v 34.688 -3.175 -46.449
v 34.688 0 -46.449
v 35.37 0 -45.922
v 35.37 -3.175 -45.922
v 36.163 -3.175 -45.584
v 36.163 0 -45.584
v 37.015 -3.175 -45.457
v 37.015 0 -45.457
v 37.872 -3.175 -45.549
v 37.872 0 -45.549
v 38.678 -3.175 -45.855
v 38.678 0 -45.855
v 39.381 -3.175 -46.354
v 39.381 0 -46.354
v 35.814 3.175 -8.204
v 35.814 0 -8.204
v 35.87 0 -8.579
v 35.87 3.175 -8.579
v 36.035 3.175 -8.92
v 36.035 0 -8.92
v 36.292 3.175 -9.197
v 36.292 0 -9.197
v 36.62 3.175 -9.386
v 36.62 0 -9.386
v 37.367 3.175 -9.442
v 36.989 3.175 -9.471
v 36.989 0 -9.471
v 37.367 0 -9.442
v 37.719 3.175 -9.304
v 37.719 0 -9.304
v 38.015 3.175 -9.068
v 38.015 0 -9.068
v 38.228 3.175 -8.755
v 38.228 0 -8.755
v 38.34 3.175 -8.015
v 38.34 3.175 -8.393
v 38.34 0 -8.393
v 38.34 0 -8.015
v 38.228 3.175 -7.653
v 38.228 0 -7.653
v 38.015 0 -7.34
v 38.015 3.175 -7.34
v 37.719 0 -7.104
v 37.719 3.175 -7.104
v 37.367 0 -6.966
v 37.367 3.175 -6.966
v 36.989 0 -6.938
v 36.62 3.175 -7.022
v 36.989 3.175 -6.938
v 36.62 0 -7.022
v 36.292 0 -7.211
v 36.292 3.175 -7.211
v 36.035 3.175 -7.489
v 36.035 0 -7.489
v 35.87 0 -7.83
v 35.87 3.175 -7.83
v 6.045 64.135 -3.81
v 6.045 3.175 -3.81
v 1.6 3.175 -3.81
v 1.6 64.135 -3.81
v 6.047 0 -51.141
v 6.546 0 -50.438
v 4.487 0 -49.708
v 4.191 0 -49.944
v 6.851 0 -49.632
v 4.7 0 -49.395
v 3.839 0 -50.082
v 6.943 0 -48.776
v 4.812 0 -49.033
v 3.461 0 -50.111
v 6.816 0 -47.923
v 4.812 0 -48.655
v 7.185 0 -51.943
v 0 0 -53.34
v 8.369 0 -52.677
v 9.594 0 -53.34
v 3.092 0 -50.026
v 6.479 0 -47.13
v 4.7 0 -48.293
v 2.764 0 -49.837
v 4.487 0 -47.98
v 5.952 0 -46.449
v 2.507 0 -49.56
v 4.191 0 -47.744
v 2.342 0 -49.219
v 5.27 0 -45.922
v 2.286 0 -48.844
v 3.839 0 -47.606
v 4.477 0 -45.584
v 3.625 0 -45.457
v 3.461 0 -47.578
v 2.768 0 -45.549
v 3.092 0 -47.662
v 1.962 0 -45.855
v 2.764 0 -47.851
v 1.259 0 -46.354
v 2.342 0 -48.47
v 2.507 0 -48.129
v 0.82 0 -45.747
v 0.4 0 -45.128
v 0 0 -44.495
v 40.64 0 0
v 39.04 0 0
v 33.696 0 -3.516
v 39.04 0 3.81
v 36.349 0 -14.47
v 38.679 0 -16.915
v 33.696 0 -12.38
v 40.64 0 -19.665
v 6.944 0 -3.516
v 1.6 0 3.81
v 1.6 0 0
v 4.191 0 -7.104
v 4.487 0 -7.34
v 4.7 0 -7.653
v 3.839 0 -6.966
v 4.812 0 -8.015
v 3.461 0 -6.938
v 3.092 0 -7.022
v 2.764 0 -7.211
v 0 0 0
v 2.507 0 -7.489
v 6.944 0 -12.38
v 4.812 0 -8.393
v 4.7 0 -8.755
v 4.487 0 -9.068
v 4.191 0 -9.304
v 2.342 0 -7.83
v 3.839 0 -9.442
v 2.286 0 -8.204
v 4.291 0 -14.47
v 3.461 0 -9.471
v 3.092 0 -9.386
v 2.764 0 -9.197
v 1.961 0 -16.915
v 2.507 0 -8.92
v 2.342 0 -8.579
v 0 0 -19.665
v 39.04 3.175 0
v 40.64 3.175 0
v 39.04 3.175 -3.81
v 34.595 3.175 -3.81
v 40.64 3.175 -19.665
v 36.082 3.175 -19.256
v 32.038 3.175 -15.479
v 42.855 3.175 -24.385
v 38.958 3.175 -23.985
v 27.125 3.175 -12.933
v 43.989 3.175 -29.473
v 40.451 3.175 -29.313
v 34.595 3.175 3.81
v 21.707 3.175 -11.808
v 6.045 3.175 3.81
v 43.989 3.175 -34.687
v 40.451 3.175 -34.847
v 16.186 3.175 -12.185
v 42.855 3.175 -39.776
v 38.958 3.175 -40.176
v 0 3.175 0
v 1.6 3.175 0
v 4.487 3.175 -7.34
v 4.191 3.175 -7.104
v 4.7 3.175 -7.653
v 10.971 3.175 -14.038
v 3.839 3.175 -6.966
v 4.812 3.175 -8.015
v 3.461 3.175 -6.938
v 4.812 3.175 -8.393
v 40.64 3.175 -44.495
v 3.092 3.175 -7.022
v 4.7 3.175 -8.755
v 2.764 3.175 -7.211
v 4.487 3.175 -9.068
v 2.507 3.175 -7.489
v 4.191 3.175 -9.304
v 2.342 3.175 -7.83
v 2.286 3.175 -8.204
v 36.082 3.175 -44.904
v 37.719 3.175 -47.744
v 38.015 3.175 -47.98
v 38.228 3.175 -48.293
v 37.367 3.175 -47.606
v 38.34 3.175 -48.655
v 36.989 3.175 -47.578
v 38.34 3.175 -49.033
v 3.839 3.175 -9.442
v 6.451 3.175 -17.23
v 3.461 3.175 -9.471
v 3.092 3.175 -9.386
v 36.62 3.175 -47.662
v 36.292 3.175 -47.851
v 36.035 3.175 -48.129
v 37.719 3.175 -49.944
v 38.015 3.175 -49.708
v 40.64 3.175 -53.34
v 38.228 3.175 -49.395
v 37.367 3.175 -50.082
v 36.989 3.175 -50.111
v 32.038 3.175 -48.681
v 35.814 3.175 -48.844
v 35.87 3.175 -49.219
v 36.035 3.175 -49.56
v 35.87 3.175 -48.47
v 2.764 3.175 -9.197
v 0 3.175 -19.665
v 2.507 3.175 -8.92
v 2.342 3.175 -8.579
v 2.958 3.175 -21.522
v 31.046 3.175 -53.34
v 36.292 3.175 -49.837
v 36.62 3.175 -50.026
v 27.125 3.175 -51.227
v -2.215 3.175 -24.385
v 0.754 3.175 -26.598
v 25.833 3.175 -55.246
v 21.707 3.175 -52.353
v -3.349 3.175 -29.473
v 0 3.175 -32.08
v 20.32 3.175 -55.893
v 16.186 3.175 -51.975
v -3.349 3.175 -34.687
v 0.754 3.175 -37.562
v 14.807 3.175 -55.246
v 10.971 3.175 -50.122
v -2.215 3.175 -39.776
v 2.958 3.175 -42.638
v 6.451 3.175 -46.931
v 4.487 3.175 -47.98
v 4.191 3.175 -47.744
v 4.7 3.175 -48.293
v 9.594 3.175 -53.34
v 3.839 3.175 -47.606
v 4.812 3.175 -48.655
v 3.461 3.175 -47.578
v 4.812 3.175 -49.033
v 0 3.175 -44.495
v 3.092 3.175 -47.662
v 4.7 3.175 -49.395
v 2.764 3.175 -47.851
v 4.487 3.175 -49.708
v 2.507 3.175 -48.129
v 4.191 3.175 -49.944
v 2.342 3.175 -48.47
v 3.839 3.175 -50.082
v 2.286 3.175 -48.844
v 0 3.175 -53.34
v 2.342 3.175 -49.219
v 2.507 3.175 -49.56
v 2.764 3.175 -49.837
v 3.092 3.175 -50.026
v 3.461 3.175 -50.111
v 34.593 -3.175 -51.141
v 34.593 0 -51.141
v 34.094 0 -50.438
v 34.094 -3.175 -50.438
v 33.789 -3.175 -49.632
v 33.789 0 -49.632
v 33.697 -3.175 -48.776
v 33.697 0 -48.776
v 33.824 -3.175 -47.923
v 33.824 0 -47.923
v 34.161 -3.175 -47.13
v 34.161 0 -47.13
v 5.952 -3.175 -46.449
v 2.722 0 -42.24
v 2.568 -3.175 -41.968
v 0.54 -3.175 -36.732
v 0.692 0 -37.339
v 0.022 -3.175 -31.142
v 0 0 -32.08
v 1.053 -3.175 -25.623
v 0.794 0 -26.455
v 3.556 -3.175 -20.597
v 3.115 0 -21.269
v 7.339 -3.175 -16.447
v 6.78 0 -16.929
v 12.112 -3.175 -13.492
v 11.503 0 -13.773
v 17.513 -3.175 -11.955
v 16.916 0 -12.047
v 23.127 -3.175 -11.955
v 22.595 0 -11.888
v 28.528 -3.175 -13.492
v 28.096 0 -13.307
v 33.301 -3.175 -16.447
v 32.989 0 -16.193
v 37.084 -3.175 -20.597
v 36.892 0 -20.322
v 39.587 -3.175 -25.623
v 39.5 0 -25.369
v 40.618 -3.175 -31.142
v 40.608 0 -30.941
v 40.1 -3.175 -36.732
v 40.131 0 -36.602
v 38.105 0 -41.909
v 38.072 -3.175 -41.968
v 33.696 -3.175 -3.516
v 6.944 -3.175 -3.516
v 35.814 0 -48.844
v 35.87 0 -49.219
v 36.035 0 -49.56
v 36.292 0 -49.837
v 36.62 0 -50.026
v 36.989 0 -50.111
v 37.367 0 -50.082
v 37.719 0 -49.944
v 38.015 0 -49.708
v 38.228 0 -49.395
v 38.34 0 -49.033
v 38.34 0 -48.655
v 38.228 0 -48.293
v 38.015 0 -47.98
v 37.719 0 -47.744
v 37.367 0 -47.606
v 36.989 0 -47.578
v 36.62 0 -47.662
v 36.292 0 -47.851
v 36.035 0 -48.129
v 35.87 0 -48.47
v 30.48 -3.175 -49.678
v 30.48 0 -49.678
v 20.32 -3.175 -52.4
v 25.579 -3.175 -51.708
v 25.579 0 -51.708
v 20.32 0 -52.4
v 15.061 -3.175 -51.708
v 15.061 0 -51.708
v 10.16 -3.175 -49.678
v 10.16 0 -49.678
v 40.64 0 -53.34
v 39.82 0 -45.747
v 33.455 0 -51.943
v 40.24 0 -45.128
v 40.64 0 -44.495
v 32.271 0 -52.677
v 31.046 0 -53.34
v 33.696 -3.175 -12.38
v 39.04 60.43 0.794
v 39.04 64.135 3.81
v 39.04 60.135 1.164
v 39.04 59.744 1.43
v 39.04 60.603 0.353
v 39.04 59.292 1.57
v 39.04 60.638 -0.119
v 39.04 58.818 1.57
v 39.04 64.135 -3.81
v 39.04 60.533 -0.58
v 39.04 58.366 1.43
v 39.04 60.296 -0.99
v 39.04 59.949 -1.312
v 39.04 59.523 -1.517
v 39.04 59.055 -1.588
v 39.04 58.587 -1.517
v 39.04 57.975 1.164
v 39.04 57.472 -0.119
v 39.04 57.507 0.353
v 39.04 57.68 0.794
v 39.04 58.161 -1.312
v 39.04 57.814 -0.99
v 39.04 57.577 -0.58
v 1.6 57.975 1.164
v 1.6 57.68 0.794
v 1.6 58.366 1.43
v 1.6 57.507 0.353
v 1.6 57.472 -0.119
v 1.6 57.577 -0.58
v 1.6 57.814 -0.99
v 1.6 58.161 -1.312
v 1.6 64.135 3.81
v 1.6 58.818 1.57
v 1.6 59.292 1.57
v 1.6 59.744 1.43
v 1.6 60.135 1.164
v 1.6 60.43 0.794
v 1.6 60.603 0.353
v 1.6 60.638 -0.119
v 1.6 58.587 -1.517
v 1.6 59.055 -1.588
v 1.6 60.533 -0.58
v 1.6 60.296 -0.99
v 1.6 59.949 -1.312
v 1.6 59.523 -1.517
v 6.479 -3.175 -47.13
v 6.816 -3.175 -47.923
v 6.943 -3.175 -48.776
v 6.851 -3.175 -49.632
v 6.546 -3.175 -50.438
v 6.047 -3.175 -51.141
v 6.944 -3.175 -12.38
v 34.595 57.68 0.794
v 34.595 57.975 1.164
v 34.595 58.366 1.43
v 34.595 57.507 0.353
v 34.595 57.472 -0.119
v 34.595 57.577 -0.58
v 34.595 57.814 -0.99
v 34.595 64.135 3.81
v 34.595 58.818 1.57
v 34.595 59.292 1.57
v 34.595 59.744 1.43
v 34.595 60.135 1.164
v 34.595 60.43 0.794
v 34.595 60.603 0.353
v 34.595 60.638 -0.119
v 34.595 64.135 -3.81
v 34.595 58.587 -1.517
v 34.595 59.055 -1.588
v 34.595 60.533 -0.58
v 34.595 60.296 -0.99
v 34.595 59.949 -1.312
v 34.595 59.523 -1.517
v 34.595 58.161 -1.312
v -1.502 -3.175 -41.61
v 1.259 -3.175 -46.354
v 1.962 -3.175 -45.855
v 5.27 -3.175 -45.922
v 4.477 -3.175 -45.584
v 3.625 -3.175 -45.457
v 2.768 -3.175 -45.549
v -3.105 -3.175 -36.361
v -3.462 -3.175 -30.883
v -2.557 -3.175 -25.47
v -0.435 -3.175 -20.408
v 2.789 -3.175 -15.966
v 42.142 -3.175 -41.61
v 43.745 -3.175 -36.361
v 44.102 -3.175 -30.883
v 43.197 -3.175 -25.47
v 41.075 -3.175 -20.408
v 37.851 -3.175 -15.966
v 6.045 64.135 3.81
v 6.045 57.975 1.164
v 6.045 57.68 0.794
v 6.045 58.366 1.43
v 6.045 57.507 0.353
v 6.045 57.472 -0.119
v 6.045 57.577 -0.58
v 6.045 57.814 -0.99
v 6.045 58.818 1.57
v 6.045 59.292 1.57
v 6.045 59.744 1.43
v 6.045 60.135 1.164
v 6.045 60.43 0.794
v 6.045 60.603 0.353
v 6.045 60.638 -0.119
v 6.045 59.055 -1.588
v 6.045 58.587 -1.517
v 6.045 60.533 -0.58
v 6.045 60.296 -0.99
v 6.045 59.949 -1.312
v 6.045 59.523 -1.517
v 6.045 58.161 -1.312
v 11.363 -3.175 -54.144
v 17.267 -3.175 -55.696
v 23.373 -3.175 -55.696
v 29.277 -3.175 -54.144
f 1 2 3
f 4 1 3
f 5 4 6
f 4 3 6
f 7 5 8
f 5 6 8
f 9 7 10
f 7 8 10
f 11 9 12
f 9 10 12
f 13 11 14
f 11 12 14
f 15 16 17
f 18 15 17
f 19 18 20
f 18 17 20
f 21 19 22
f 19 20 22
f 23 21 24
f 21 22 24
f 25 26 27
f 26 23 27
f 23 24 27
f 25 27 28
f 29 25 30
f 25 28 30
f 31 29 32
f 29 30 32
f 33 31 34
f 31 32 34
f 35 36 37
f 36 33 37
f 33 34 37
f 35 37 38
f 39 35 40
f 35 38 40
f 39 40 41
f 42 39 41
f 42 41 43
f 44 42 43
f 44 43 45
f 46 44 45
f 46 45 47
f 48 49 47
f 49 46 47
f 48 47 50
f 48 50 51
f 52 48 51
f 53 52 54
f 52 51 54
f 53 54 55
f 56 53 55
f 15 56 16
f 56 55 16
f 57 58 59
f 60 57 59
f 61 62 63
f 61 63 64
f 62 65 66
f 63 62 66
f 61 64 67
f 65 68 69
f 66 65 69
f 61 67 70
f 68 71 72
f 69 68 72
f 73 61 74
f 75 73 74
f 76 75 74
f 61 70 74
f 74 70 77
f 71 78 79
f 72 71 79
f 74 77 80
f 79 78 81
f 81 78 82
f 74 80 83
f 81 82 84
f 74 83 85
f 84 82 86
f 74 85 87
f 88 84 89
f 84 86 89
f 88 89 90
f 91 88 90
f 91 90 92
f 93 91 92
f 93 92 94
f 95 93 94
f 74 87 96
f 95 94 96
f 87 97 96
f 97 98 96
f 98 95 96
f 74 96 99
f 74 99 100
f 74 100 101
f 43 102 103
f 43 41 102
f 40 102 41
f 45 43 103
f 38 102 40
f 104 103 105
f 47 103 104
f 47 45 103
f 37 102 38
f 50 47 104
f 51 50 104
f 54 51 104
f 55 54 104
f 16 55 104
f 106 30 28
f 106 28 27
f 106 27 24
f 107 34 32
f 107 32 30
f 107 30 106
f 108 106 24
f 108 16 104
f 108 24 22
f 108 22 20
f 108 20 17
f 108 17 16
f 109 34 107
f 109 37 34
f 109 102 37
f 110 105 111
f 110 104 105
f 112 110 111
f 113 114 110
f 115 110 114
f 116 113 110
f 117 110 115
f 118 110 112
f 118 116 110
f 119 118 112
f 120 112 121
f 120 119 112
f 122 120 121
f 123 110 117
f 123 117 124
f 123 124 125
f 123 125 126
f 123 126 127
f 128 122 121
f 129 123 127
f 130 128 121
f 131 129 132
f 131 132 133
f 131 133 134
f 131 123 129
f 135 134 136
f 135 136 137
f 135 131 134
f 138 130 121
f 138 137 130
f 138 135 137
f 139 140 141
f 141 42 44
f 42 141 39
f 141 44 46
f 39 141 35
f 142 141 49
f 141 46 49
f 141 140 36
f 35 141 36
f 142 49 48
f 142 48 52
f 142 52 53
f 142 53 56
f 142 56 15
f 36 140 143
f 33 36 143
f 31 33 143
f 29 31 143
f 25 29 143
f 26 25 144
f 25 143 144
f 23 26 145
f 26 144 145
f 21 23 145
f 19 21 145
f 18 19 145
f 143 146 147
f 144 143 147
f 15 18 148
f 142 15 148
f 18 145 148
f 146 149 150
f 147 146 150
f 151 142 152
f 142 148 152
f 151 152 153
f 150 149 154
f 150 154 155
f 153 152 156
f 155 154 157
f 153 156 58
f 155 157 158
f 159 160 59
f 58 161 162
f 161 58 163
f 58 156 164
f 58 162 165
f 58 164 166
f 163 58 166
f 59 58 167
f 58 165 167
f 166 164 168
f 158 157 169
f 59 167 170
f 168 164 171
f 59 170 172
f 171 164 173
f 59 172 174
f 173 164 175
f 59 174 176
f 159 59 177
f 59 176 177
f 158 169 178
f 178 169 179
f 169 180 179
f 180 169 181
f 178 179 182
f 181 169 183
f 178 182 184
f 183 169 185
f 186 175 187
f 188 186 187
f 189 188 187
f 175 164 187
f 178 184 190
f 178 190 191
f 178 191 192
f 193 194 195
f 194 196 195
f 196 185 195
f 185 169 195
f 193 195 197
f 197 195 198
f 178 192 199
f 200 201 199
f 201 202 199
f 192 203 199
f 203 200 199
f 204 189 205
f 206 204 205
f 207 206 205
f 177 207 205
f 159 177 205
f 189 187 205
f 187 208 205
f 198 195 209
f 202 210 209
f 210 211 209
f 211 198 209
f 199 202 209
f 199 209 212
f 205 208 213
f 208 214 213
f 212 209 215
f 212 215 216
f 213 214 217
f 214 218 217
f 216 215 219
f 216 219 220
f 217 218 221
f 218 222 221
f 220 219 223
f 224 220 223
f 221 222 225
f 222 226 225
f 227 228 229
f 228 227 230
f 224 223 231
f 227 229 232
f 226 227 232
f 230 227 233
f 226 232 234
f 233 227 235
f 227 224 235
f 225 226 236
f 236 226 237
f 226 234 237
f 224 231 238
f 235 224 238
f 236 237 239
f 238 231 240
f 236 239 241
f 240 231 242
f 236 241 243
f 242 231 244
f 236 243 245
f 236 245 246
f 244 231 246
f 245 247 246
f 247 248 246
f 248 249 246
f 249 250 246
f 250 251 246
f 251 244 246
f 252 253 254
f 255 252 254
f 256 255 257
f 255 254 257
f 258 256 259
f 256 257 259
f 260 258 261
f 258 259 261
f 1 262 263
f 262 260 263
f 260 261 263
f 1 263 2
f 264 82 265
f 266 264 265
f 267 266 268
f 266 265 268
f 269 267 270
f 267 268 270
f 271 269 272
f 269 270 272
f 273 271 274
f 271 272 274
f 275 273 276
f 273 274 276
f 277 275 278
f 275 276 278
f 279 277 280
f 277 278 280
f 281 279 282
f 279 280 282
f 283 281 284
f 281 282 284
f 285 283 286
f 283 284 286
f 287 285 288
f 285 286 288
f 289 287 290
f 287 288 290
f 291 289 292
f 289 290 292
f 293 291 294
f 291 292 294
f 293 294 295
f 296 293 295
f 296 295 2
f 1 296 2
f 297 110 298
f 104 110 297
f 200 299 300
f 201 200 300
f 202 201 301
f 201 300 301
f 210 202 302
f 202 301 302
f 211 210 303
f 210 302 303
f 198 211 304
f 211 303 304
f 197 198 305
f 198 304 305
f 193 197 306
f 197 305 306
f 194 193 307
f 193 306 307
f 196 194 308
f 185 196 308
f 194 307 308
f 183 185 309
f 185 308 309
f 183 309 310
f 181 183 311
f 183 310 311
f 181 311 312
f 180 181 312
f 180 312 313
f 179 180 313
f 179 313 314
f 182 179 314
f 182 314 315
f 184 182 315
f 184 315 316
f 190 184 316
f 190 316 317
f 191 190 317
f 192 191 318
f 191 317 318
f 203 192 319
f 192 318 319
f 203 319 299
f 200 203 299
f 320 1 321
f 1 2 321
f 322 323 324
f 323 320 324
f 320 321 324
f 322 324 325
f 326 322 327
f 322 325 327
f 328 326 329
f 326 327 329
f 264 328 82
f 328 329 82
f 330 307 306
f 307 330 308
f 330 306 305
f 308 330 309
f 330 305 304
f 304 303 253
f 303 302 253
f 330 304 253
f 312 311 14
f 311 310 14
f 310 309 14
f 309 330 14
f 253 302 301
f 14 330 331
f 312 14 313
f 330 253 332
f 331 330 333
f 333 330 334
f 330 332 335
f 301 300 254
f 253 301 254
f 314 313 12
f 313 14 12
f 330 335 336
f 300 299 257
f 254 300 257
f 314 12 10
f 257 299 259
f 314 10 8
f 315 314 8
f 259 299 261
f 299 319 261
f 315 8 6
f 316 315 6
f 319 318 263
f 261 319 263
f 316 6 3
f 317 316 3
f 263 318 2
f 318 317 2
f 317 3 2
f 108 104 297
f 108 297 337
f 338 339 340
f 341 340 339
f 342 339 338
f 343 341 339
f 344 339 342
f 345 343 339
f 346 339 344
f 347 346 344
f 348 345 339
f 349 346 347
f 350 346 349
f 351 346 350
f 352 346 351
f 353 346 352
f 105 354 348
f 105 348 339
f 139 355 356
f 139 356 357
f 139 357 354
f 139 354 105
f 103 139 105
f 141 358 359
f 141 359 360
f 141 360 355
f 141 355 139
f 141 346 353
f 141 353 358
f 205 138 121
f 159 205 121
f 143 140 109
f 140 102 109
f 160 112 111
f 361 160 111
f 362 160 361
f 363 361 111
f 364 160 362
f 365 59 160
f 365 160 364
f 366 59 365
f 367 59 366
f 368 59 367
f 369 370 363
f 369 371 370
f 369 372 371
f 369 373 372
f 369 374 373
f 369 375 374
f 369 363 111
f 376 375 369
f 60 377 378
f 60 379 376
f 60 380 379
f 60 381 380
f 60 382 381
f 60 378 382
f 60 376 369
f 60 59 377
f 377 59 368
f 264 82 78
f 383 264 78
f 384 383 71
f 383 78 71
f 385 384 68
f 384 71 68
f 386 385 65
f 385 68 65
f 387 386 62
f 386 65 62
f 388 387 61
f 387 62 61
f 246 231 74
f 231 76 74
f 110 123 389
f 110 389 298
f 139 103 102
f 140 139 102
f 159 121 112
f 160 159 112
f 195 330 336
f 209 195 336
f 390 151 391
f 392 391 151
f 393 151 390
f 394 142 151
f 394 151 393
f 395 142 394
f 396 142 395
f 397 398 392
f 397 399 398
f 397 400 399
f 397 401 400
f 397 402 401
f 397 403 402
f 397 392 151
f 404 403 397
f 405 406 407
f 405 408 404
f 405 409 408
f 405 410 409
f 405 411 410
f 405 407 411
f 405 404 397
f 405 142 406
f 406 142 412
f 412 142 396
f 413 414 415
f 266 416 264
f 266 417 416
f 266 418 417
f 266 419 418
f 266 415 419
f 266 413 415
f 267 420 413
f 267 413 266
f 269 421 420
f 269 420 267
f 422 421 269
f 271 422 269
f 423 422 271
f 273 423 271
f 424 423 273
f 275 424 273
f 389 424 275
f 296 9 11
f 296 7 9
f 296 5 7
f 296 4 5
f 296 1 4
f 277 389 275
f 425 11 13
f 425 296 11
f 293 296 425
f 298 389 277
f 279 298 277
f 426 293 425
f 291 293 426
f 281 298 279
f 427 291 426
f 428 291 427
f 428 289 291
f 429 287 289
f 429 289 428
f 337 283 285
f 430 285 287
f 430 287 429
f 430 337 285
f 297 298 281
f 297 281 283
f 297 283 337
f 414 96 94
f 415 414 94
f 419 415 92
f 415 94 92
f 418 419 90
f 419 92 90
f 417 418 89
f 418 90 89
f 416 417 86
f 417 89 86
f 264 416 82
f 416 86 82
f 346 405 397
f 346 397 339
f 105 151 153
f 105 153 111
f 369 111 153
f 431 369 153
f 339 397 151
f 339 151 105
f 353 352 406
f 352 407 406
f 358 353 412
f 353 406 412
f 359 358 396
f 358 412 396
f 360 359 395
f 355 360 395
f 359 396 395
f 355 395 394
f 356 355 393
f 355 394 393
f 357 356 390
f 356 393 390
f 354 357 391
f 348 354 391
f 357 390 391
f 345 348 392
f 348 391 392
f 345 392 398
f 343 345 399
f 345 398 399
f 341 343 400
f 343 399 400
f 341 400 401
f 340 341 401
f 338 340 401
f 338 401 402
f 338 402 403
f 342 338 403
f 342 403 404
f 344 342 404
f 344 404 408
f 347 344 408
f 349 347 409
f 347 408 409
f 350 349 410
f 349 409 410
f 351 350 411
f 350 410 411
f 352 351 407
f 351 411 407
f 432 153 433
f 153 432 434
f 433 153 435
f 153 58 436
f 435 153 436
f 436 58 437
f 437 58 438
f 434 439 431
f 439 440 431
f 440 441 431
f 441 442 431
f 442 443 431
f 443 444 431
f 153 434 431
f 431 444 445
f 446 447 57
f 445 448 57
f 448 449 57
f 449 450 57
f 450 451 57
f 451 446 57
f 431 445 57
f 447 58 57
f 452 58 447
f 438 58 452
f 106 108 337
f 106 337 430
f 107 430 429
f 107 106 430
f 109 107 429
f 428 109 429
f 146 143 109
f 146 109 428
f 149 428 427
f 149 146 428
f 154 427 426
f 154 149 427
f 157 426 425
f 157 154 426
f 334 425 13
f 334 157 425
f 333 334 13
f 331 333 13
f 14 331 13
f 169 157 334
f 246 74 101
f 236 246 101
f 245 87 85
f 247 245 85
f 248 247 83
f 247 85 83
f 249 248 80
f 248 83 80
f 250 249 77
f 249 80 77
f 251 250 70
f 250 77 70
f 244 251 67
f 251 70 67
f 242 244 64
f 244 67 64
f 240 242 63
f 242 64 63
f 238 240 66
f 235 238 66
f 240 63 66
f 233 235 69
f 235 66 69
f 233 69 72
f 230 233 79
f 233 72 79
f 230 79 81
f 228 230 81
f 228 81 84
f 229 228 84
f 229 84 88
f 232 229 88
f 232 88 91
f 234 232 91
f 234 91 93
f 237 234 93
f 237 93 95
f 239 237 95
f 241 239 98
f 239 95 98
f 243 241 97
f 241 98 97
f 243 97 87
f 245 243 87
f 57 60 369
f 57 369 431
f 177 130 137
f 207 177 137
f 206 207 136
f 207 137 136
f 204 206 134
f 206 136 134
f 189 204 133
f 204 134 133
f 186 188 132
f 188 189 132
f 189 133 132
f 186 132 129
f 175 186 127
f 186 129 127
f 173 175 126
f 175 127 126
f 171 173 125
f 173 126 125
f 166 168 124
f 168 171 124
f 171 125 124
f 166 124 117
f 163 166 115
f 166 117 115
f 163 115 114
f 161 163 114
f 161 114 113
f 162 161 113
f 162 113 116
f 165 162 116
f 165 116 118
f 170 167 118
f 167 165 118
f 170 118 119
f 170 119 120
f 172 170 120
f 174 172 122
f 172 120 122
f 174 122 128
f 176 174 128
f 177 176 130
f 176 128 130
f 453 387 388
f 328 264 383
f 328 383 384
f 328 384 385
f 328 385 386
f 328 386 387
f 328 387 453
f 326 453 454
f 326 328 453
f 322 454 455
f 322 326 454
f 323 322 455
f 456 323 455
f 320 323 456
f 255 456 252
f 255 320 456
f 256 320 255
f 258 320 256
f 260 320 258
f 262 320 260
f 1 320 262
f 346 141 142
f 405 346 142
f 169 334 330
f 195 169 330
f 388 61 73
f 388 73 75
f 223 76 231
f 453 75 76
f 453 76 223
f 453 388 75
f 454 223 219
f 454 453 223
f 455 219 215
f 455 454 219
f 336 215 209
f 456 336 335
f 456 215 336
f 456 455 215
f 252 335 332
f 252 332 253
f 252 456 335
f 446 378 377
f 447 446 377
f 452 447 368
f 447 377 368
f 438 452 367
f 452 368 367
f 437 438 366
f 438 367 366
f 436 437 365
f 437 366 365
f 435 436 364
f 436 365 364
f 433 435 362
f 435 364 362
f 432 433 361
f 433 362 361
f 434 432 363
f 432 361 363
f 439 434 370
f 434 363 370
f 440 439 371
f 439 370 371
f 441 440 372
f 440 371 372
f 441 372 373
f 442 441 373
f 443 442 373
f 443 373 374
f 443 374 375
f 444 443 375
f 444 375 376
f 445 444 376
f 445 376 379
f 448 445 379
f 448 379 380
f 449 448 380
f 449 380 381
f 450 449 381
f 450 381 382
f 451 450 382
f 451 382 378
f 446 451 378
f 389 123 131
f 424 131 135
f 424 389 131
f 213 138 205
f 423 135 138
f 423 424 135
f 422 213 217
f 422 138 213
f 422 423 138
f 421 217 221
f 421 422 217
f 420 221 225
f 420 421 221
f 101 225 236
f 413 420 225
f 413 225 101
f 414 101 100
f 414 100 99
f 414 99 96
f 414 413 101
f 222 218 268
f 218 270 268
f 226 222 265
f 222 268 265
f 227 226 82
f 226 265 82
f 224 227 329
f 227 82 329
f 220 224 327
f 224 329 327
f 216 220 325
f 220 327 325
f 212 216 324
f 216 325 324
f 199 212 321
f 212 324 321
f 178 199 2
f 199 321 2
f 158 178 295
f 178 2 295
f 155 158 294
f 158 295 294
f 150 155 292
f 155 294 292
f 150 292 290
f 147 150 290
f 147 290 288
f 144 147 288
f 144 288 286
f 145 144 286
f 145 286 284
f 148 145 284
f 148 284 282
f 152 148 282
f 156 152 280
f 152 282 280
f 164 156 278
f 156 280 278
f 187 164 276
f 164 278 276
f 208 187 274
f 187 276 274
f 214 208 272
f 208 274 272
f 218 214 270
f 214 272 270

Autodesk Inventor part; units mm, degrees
ref_plane "YZ Plane" through (0, 0, 0) normal (1, 0, 0) x (0, 1, 0)
ref_plane "XZ Plane" through (0, 0, 0) normal (0, 1, 0) x (-1, 0, 0)
ref_plane "XY Plane" through (0, 0, 0) normal (0, 0, 1) x (1, 0, 0)
sketch "Sketch1" plane through (0, 0, 0) normal (0, 1, 0) x (-1, 0, 0)
  line L0 (0, 0) -> (-40.64, 0)
  line L1 (-40.64, 0) -> (-40.64, -53.34)
  line L2 (-40.64, -53.34) -> (0, -53.34)
  line L3 (0, -53.34) -> (0, 0)
  circle A0 centre (-20.32, -32.0802) radius 20.32
  circle A1 centre (-20.32, -32.0802) radius 23.8125
  circle A2 centre (-3.556, -48.8442) radius 1.27
  circle A3 centre (-37.084, -48.8442) radius 1.27
  circle A4 centre (-37.084, -8.2042) radius 1.27
  circle A5 centre (-3.556, -8.2042) radius 1.27
  line L4 (-20.32, 0) -> (-20.32, -32.0802) construction
  point P0 (-40.64, -19.6652)
  point P1 (-40.64, -44.4952)
  point P2 (-31.0464, -53.34)
  point P3 (-9.5936, -53.34)
  point P4 (0, -44.4952)
  point P5 (0, -19.6652)
  dimension "d51" = 53.34
  dimension "d52" = 40.64
  dimension "d53" = 40.64
  dimension "d54" = 47.625
  dimension "d57" = 33.528
  dimension "d58" = 40.64
  dimension "d59" = 2.54
  dimension "d60" = 8.2042
  dimension "d63" = 32.0802
extrude "Extrusion1" add sketch "Sketch1" along normal blind 3.175 contours L3 A1 L1 L0 | A1 L3 | L3 A0 L1 A1 | L1 A1 | L3 A1 A2 L2 A3 L1 A0 | A1 A3 L2 L1 | L3 L2 A1 A2 | L2 A1
sketch "Sketch2" plane through (0, 3.175, 0) normal (0, 1, 0) x (1, 0, 0)
  line L0 (1.6002, 0) -> (39.0398, 0)
  line L1 (39.0398, 0) -> (39.0398, 3.81)
  line L2 (39.0398, 3.81) -> (1.6002, 3.81)
  line L3 (1.6002, 3.81) -> (1.6002, 0)
  line L4 (6.0452, 3.81) -> (6.0452, 0)
  line L5 (1.6002, 0) -> (39.0398, 0)
  line L6 (34.5948, 3.81) -> (34.5948, 0)
  line L7 (20.32, 3.81) -> (20.32, 0) construction
  circle A0 centre (20.32, 32.0802) radius 20.32 construction
  line L8 (20.32, 52.4002) -> (20.32, 32.0802) construction
  point P0 (34.5948, 0)
  point P1 (6.0452, 0)
  point P2 (20.32, 1.905)
  point P3 (6.0452, 1.905)
  dimension "d68" = 14.2748
  dimension "d69" = 4.445
  dimension "d70" = 3.81
extrude "Extrusion2" add sketch "Sketch2" along normal blind 60.96 contours L3 L2 L4 L0 | L6 L2 L1 L0
sketch "Sketch10" plane through (0, 0, 0) normal (0, -1, 0) x (1, 0, 0)
  circle A0 centre (20.32, -32.0802) radius 20.32 construction
  line L0 (20.32, -52.4002) -> (20.32, -32.0802) construction
  circle A1 centre (20.32, -32.0802) radius 20.32
  circle A2 centre (37.084, -48.8442) radius 1.27 projected
  circle A3 centre (37.084, -48.8442) radius 3.3879
  circle A4 centre (3.556, -48.8442) radius 1.27 projected
  circle A5 centre (3.556, -48.8442) radius 3.3879
  circle A6 centre (20.32, -32.0802) radius 23.8125
  line L1 (33.6961, -12.3796) -> (6.9439, -12.3796)
  line L2 (6.9439, -12.3796) -> (6.9439, -3.5159)
  line L3 (6.9439, -3.5159) -> (33.6961, -3.5159)
  line L4 (33.6961, -3.5159) -> (33.6961, -12.3796)
  point P0 (0, 0)
  point P1 (34.6884, -46.4486)
  point P2 (39.3806, -46.3536)
  point P3 (6.9439, -12.3796)
  point P4 (1.2594, -46.3536)
  point P5 (5.9516, -46.4486)
  point P6 (6.0466, -51.1408)
  point P7 (34.5934, -51.1408)
extrude "Extrusion5" add sketch "Sketch10" along normal blind 3.175 contours A1 L1 A6 A3 | A1 L1 A6 | A3 A6 A5 A1 | A1 A5 A6 L1 | A6 L2 L3 L4
sketch "Sketch11" plane through (0, 0, 0) normal (0, 0, 1) x (1, 0, 0)
  line L0 (1.6002, 64.135) -> (6.0452, 64.135) projected
  line L1 (1.6002, 64.135) -> (39.0398, 64.135)
  line L2 (39.0398, 64.135) -> (39.0398, 0)
  line L3 (39.0398, 0) -> (1.6002, 0)
  line L4 (1.6002, 0) -> (1.6002, 64.135)
  line L5 (39.0398, 3.175) -> (39.0398, 64.135) construction
  line L6 (39.0398, 3.175) -> (39.0398, 0) construction
  line L7 (40.64, 0) -> (33.6961, 0) construction
  line L8 (34.5948, 3.175) -> (34.5948, 64.135) projected
  line L9 (6.0452, 64.135) -> (34.5948, 64.135)
  line L10 (34.5948, 64.135) -> (34.5948, 3.175)
  line L11 (34.5948, 3.175) -> (6.0452, 3.175)
  line L12 (6.0452, 3.175) -> (6.0452, 64.135)
  point P0 (0, 0)
extrude "Extrusion6" add sketch "Sketch11" along normal blind 3.81 contours L0 L12 L11 L8 L1 L2 L3 L4
sketch "Sketch12" plane through (39.0398, 3.175, 0) normal (1, 0, 0) x (0, 0, -1)
  line L0 (3.81, 60.96) -> (-3.81, 60.96) construction
  line L1 (0, 60.96) -> (0, 55.88) construction
  point P0 (0, -3.175)
  dimension "d73" = 5.08
hole "Hole4" at (39.0398, 59.055, 0) direction (-1, 0, 0) diameter 3.175 depth 37.4396
properties part number "m500 thermal bracket"
